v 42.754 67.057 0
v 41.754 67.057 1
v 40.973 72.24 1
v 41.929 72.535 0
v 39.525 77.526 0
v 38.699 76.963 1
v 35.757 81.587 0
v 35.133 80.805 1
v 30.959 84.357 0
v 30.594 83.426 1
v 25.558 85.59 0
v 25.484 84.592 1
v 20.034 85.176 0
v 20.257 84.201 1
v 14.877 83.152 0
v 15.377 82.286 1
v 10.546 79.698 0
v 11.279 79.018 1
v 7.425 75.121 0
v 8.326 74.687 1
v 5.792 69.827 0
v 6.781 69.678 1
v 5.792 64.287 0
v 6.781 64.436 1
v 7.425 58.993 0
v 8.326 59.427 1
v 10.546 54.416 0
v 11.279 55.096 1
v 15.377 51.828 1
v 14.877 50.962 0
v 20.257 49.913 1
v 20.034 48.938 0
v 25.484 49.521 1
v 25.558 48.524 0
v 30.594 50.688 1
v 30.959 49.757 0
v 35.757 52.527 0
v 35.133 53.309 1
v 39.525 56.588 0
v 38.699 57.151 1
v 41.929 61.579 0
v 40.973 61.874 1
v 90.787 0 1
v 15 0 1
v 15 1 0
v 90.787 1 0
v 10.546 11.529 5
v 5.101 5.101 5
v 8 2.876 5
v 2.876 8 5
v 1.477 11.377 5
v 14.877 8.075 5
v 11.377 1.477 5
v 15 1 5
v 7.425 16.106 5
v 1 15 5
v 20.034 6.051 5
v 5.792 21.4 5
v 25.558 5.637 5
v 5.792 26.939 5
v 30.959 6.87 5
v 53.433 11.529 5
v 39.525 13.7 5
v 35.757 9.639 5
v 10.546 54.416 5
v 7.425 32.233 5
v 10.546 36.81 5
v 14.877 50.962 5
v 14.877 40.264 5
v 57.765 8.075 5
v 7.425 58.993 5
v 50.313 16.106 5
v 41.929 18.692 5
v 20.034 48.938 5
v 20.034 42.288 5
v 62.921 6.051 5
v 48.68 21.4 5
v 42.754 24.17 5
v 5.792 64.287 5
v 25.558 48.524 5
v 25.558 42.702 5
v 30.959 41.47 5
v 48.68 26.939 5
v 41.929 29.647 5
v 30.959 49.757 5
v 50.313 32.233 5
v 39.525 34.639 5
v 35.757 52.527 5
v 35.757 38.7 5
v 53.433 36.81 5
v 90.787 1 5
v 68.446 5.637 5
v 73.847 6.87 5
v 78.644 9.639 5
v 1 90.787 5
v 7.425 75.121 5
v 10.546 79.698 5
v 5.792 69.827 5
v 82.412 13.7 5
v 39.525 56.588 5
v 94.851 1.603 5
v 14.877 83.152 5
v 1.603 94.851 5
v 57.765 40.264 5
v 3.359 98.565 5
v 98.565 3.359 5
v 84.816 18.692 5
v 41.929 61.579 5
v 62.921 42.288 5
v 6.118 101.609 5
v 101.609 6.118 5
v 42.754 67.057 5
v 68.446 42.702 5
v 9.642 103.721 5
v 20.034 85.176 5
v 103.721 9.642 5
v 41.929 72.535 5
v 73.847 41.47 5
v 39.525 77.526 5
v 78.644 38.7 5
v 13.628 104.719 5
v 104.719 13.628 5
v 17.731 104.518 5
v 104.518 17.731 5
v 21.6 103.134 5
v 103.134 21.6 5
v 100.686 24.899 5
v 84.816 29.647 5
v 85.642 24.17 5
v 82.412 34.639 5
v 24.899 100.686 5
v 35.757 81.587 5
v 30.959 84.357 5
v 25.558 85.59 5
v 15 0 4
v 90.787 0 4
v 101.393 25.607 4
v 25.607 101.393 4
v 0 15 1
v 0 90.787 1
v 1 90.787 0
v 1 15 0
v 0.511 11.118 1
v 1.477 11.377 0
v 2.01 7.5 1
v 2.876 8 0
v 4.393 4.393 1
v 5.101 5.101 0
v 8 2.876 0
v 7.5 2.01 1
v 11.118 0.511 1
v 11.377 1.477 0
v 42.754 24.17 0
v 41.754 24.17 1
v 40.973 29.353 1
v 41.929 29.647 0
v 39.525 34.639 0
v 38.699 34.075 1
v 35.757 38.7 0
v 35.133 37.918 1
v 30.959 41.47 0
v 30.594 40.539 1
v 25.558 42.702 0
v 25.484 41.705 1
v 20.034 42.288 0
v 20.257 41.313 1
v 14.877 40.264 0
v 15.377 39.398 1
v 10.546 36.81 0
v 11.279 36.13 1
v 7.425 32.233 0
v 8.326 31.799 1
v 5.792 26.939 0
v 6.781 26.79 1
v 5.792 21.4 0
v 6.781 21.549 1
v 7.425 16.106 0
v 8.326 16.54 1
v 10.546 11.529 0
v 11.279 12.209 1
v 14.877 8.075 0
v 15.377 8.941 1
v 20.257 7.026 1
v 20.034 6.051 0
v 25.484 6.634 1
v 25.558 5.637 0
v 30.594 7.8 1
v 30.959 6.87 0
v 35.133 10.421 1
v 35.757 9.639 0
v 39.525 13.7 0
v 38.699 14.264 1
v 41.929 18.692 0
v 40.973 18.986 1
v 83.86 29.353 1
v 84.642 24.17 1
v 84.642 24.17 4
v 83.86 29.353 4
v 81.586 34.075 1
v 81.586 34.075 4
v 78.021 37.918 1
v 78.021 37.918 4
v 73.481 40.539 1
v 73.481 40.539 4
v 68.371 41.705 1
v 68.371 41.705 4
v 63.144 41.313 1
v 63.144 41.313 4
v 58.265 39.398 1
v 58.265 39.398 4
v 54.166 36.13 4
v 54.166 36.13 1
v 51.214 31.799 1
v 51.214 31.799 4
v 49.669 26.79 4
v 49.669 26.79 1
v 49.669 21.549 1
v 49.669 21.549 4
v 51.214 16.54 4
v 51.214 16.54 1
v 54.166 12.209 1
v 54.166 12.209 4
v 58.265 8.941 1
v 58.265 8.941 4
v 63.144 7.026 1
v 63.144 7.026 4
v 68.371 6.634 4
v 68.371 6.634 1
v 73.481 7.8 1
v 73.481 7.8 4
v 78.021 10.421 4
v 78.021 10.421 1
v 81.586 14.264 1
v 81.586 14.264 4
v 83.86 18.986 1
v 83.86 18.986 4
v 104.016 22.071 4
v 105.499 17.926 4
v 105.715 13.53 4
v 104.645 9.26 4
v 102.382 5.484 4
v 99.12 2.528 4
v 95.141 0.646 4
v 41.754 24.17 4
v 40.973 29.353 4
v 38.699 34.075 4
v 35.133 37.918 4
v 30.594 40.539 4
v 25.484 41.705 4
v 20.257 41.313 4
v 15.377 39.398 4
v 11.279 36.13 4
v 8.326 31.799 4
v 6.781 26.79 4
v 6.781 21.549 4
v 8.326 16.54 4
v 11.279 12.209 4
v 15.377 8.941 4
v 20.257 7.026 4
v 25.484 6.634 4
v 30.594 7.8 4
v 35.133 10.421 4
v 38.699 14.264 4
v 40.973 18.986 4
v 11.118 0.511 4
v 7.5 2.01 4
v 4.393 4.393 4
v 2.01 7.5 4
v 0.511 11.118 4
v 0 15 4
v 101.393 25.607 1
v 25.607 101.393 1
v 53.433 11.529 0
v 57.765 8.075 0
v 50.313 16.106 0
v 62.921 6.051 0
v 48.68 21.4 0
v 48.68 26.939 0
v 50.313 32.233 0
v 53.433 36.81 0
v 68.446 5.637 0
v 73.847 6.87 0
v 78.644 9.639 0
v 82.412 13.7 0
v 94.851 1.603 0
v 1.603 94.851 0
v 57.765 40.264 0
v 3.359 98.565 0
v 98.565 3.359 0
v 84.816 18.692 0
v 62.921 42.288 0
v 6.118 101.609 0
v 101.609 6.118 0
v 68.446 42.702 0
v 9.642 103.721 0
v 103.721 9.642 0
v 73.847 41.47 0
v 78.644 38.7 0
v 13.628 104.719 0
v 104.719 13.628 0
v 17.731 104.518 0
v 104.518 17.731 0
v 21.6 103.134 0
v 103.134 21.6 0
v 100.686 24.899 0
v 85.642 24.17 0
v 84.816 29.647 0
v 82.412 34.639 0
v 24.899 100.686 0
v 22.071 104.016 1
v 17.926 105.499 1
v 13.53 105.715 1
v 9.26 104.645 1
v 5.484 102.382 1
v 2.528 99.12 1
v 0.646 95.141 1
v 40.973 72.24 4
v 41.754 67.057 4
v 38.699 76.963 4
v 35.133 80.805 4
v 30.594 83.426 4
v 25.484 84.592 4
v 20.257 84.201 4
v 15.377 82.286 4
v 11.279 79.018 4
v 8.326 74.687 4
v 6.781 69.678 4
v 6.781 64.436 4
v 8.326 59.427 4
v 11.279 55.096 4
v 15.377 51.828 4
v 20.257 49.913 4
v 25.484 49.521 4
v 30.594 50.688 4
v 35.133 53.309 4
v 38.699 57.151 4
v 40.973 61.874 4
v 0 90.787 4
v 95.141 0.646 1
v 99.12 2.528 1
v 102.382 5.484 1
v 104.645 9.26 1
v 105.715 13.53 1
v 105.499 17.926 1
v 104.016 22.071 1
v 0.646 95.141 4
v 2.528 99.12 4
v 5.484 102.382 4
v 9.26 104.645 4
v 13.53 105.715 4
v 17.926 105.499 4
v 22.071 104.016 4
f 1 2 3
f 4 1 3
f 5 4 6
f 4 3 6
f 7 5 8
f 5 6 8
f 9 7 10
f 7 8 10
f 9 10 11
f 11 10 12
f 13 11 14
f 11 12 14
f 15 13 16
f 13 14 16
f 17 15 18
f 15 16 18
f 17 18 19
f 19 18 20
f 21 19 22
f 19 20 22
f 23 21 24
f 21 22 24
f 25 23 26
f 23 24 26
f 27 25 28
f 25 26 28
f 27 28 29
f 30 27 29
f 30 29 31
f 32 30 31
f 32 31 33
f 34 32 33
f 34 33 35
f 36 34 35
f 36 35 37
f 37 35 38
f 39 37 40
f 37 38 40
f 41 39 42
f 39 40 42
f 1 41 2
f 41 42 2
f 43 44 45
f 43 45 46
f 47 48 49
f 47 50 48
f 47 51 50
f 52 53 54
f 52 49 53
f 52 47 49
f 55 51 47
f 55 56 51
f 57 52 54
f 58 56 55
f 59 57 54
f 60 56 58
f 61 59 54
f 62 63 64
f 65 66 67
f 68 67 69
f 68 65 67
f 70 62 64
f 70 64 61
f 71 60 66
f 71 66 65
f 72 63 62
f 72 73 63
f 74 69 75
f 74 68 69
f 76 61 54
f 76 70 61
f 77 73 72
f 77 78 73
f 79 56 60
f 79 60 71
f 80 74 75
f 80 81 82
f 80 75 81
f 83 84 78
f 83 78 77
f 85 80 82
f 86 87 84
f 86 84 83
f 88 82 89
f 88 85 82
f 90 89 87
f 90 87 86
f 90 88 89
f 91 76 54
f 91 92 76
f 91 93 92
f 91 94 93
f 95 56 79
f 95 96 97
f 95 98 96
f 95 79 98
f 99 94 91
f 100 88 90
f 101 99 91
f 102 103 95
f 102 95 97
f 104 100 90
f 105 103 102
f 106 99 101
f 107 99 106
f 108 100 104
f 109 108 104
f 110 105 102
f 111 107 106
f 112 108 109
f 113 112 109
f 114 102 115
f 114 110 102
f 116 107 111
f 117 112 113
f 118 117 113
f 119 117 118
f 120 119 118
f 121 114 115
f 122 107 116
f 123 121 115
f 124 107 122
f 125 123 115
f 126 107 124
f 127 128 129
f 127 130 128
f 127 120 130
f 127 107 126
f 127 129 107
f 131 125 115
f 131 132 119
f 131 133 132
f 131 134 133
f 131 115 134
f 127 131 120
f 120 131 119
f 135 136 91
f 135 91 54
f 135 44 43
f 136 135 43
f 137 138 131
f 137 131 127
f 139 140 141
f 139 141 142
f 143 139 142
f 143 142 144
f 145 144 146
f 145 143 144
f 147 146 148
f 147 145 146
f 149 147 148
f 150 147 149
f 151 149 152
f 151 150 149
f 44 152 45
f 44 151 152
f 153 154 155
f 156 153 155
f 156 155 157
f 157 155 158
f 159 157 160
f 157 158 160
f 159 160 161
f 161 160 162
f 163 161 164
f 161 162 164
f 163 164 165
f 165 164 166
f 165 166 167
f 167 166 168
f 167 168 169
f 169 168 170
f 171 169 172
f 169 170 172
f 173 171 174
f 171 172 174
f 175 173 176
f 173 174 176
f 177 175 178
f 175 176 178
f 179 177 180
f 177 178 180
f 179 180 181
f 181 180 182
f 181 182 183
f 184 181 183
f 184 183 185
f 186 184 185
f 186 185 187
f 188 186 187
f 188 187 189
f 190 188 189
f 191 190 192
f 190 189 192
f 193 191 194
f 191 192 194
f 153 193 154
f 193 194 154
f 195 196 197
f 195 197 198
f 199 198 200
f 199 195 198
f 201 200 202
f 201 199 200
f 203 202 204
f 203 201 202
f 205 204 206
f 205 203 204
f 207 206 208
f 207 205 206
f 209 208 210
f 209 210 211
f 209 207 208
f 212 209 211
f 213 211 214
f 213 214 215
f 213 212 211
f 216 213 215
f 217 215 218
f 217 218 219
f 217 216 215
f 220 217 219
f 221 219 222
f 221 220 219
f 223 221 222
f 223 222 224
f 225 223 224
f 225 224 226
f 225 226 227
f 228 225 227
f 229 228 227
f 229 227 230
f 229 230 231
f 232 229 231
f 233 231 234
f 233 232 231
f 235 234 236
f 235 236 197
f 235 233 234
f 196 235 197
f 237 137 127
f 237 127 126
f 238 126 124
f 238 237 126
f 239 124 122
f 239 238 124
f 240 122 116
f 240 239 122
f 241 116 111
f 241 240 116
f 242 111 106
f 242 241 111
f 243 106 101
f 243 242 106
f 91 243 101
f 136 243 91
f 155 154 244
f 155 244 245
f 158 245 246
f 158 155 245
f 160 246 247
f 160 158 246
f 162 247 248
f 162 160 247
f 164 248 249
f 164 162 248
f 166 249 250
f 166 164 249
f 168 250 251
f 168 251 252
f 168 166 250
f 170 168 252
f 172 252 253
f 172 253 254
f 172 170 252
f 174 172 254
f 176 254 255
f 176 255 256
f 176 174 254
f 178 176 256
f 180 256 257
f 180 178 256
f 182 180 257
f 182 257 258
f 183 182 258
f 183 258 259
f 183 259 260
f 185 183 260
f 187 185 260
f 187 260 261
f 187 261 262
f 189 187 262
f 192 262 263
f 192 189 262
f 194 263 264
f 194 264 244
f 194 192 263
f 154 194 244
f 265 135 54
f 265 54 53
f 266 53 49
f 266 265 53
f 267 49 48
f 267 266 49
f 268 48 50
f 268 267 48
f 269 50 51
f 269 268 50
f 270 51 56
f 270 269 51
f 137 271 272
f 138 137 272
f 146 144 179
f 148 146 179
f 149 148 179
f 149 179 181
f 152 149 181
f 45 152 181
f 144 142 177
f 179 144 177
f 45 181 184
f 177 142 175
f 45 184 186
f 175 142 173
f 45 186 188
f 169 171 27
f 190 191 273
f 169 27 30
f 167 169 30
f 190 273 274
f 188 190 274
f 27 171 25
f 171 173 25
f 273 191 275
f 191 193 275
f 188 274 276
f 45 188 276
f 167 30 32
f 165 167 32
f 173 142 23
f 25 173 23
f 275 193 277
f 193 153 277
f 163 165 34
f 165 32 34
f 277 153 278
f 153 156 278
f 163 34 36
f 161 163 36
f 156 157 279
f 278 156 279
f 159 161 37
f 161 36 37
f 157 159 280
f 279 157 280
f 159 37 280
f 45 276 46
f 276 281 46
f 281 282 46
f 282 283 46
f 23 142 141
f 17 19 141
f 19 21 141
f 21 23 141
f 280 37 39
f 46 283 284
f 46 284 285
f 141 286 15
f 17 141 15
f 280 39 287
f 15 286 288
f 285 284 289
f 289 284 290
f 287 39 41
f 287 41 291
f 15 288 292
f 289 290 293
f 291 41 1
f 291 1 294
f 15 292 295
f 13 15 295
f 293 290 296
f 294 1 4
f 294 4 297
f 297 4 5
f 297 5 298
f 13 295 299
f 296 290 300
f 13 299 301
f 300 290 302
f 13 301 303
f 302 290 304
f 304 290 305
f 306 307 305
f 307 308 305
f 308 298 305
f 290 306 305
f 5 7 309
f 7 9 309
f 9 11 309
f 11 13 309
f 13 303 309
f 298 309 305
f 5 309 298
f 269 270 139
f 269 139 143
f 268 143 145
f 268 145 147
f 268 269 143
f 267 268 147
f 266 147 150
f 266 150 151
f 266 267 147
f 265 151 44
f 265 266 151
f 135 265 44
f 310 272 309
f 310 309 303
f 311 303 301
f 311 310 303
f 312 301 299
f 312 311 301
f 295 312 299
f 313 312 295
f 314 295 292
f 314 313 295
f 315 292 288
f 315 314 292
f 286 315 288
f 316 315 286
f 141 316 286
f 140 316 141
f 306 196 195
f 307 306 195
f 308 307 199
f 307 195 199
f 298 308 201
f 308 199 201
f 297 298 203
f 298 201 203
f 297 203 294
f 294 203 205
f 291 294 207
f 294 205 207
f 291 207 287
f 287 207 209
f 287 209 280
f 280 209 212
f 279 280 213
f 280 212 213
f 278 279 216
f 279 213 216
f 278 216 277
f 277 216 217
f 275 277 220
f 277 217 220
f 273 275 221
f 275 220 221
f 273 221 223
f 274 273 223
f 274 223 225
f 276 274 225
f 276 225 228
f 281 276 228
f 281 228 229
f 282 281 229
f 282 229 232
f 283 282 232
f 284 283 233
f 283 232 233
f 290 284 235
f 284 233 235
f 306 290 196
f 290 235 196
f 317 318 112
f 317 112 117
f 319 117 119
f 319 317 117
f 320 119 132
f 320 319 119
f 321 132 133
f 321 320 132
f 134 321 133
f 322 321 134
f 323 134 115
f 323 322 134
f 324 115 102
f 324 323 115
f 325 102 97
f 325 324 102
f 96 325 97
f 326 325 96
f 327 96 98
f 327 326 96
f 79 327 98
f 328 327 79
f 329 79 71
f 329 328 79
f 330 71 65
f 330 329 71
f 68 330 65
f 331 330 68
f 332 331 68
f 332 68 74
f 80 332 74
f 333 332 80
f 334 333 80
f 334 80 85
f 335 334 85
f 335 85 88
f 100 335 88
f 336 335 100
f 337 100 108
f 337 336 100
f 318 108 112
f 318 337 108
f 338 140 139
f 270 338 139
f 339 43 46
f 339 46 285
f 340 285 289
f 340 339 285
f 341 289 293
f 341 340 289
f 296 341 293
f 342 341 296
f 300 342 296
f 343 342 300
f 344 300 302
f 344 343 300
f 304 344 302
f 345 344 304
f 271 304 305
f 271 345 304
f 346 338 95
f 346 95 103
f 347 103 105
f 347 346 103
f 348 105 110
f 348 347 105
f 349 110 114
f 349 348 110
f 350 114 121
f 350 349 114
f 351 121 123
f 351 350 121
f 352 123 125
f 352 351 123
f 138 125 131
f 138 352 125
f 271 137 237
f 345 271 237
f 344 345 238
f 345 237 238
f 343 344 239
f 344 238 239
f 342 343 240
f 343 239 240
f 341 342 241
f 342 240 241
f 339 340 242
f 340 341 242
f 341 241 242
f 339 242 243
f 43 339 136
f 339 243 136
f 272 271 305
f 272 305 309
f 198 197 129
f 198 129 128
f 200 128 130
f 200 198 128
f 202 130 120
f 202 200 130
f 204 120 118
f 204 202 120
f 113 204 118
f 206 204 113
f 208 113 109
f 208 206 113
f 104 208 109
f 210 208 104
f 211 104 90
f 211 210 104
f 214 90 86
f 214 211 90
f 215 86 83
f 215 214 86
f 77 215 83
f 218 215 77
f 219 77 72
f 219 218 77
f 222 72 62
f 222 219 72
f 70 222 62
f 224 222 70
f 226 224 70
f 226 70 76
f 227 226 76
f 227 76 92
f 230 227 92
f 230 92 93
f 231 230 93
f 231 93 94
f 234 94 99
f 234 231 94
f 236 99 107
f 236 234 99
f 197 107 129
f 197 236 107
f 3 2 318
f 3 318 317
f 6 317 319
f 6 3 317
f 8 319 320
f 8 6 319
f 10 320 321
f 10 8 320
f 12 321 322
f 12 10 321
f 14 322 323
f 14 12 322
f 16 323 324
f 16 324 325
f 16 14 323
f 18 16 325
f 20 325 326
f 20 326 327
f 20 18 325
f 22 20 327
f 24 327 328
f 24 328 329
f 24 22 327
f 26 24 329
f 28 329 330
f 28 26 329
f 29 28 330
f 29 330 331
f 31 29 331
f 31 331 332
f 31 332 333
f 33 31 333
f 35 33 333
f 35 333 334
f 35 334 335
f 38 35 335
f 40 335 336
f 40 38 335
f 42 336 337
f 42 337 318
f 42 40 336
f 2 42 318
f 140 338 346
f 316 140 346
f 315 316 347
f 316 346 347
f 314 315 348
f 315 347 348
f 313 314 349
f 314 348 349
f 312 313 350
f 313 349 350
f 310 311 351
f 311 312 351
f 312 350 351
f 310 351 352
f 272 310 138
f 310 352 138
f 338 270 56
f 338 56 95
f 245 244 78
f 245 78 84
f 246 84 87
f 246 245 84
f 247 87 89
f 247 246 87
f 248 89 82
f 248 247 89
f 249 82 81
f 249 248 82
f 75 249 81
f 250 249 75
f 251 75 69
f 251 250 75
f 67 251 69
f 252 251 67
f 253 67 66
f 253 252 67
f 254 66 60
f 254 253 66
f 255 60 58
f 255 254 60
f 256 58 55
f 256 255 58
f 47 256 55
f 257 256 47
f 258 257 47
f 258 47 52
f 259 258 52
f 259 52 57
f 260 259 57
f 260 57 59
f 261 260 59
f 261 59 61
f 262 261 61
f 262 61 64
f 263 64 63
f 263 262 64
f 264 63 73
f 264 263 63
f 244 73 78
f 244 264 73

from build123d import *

# Parameters (mm, degrees)
F0_R     = 17.5846989279
F1_DEPTH = 5
F2_R     = 15
F3_SIZE  = 1


# Not quite as in the source:
# - a feature names something its author has since deleted; it is built from what else it names


with BuildPart() as f1:
    # F0 (on Top) → F1 (new body)
    with BuildSketch(Plane.XY):
        Polygon((0, 127), (0, 0), (127, 0), align=None)
        with Locations((24.1695605218, 24.1695605218)):
            Circle(F0_R, mode=Mode.SUBTRACT)
        with Locations((67.0569464564, 24.1695605218)):
            Circle(F0_R, mode=Mode.SUBTRACT)
        with Locations((24.1695605218, 67.0569464564)):
            Circle(F0_R, mode=Mode.SUBTRACT)
    extrude(amount=F1_DEPTH)

    # F2
    f2_edges = [f1.edges().sort_by_distance(p)[0] for p in [
        (127, 0, 2.5),
        (0, 0, 2.5),
        (0, 127, 2.5),
    ]]
    fillet(f2_edges, radius=F2_R)

    # F3
    f3_edges = [f1.edges().sort_by_distance(p)[0] for p in [
        (104.64499, 9.259749, 5),
        (63.5, 63.5, 0),
        (6.584862, 24.169561, 5),
        (49.472248, 24.169561, 5),
        (6.584862, 67.056946, 0),
        (6.584862, 24.169561, 0),
        (49.472248, 24.169561, 0),
        (6.584862, 67.056946, 5),
        (0, 52.893398, 0),
        (0, 52.893398, 5),
        (9.259749, 104.64499, 0),
        (4.393398, 4.393398, 0),
        (52.893398, 0, 0),
        (104.64499, 9.259749, 0),
        (9.259749, 104.64499, 5),
        (4.393398, 4.393398, 5),
        (63.5, 63.5, 5),
        (52.893398, 0, 5),
    ]]
    chamfer(f3_edges, length=F3_SIZE)


solid = f1.part
